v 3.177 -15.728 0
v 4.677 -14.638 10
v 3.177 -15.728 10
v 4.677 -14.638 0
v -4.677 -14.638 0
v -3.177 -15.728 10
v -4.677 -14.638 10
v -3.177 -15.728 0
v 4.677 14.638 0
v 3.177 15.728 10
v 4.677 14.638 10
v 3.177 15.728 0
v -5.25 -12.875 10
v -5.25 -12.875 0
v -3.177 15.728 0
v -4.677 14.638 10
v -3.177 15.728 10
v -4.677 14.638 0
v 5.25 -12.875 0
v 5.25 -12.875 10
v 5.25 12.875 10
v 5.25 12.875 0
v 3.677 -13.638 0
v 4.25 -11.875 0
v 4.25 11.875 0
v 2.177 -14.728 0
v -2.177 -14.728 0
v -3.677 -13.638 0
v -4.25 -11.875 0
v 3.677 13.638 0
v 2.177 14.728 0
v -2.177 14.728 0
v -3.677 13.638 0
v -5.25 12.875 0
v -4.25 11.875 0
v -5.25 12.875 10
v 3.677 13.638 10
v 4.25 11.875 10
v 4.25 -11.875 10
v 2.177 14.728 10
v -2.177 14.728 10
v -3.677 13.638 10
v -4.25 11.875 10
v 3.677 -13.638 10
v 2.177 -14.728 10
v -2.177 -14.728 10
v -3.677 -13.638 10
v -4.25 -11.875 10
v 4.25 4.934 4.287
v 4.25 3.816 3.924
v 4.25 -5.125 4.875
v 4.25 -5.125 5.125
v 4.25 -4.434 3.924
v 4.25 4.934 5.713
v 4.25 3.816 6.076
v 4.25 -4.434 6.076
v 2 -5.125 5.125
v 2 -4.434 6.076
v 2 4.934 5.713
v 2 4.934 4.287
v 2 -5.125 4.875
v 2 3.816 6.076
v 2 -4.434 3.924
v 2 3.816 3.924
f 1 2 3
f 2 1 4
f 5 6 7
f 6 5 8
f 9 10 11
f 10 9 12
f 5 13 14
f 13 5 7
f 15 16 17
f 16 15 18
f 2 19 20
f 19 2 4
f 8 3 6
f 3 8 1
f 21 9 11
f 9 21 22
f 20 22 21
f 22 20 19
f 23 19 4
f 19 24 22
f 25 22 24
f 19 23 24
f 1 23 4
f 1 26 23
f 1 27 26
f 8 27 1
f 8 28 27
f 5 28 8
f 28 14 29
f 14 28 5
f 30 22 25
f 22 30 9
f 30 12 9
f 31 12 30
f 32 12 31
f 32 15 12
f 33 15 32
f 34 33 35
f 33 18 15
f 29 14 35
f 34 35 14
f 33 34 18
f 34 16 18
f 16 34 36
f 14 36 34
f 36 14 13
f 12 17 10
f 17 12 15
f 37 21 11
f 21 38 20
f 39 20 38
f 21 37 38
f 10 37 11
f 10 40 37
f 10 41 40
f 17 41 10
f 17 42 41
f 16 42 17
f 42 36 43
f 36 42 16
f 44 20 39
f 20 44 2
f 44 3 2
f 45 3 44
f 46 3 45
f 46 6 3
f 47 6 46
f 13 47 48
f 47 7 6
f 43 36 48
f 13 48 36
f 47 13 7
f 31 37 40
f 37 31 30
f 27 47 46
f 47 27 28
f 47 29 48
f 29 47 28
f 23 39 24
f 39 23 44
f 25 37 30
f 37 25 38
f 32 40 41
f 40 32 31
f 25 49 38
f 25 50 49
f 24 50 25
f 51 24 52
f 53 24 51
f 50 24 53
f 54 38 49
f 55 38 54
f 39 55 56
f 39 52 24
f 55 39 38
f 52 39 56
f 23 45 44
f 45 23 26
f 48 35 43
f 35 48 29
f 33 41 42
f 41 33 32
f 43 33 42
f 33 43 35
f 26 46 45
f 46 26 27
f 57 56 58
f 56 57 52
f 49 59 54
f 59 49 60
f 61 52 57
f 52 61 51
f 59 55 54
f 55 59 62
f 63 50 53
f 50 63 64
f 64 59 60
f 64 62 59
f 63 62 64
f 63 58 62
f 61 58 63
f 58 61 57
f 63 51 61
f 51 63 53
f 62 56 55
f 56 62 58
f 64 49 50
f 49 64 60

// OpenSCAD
width = 5.5;
length = 26.75;
height = 10;
bandThickness = 2;
radius = 3;

tabRendered = 1;
tabWidth = 2.25;
tabLength = 9.25;
tabHeight = 1.25;
tabRadius = 1;


difference(){
    roundedRect([width+bandThickness,length+bandThickness,height], center=true, radius);
    translate([0,0,-1]){roundedRect([width,length,height+5], center=true, radius);}
}
if(tabRendered){translate([(width/2)+(radius/2),0,height/2]){rotate([90,0,-90]){roundedRect([tabLength, tabHeight, tabWidth], center=true, tabRadius);}}}


// size - [x,y,z]
// radius - radius of corners
module roundedRect(size, radius)
{
	x = size[0];
	y = size[1];
	z = size[2];

	linear_extrude(height=z)
	hull()
	{
		// place 4 circles in the corners, with the given radius
		translate([(-x/2)+(radius/2), (-y/2)+(radius/2), 0])
		circle(r=radius);
	
		translate([(x/2)-(radius/2), (-y/2)+(radius/2), 0])
		circle(r=radius);
	
		translate([(-x/2)+(radius/2), (y/2)-(radius/2), 0])
		circle(r=radius);
	
		translate([(x/2)-(radius/2), (y/2)-(radius/2), 0])
		circle(r=radius);
	}
}
